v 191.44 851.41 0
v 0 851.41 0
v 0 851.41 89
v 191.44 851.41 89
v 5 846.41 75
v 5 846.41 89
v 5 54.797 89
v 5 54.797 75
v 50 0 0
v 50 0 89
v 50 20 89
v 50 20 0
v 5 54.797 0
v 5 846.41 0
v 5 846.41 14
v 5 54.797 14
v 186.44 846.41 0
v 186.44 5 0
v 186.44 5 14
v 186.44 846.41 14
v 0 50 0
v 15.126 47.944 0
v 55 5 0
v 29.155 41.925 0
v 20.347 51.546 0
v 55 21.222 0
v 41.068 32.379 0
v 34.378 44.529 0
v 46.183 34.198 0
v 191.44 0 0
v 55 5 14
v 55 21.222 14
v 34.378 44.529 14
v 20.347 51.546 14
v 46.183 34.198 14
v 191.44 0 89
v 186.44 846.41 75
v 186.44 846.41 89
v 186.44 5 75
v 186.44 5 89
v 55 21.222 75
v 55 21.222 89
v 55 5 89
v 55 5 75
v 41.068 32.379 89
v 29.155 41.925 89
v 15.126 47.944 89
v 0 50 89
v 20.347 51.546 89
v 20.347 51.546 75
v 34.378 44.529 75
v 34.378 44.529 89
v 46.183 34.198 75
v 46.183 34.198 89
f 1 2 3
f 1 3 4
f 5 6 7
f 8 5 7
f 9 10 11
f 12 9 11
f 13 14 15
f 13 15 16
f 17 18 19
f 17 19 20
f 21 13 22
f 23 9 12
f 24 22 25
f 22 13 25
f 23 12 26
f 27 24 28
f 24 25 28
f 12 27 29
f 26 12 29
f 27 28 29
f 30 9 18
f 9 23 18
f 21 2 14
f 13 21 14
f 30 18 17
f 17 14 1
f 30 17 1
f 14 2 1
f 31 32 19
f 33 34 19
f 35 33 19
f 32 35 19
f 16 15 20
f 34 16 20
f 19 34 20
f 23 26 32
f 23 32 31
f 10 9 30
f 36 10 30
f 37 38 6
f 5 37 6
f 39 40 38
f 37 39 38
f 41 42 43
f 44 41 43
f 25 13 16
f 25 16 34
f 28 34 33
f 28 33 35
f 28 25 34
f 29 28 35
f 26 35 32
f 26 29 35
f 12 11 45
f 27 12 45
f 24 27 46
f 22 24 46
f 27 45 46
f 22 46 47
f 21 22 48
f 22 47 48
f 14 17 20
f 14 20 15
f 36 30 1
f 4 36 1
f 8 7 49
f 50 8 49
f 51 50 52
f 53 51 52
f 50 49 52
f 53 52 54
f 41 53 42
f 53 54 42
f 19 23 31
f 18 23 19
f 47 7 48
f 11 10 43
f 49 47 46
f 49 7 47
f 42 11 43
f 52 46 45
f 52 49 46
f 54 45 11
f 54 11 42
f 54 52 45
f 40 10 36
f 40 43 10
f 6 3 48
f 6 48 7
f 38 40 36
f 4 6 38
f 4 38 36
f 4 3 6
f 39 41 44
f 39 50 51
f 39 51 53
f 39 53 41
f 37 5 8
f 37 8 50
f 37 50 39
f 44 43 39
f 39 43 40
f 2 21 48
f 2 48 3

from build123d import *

# Parameters (mm, degrees)
SKETCH1_W           = 191.44
SKETCH1_H           = 851.41
BOSS_EXTRUDE1_DEPTH = 89
CUT_EXTRUDE1_DEPTH  = 89
CUT_EXTRUDE2_DEPTH  = 14


with BuildPart() as part:
    # Sketch1 → Boss-Extrude1 (new body)
    with BuildSketch(Plane.XY):
        with Locations((95.72, 425.705)):
            Rectangle(SKETCH1_W, SKETCH1_H)
    extrude(amount=BOSS_EXTRUDE1_DEPTH)

    # Sketch2 → Cut-Extrude1 (cut)
    with BuildSketch(Plane.XY.offset(89)):
        with BuildLine():
            Line((50, 0), (50, 20))
            ThreePointArc((50, 20), (29.154759474, 41.924599124), (0, 50))
            Line((0, 50), (-42.502715258, 50))
            Line((-42.502715258, 50), (0, -54.761569713))
            Line((0, -54.761569713), (50, 0))
        make_face()
    extrude(amount=-CUT_EXTRUDE1_DEPTH, mode=Mode.SUBTRACT)

    # Sketch3 → Cut-Extrude2 (cut)
    with BuildSketch(Plane.XY.offset(89)):
        with BuildLine():
            Line((55, 21.222000884), (55, 5))
            Line((55, 5), (186.44, 5))
            Line((186.44, 5), (186.44, 846.41))
            Line((186.44, 846.41), (5, 846.41))
            Line((5, 846.41), (5, 54.796963049))
            ThreePointArc((5, 54.796963049), (34.377602026, 44.528628593), (55, 21.222000884))
        make_face()
    cut_extrude2 = extrude(amount=-CUT_EXTRUDE2_DEPTH, mode=Mode.SUBTRACT)

    # Mirror1: Cut-Extrude2 across plane
    add(cut_extrude2.mirror(Plane.XY.offset(44.5)), mode=Mode.SUBTRACT)


solid = part.part
